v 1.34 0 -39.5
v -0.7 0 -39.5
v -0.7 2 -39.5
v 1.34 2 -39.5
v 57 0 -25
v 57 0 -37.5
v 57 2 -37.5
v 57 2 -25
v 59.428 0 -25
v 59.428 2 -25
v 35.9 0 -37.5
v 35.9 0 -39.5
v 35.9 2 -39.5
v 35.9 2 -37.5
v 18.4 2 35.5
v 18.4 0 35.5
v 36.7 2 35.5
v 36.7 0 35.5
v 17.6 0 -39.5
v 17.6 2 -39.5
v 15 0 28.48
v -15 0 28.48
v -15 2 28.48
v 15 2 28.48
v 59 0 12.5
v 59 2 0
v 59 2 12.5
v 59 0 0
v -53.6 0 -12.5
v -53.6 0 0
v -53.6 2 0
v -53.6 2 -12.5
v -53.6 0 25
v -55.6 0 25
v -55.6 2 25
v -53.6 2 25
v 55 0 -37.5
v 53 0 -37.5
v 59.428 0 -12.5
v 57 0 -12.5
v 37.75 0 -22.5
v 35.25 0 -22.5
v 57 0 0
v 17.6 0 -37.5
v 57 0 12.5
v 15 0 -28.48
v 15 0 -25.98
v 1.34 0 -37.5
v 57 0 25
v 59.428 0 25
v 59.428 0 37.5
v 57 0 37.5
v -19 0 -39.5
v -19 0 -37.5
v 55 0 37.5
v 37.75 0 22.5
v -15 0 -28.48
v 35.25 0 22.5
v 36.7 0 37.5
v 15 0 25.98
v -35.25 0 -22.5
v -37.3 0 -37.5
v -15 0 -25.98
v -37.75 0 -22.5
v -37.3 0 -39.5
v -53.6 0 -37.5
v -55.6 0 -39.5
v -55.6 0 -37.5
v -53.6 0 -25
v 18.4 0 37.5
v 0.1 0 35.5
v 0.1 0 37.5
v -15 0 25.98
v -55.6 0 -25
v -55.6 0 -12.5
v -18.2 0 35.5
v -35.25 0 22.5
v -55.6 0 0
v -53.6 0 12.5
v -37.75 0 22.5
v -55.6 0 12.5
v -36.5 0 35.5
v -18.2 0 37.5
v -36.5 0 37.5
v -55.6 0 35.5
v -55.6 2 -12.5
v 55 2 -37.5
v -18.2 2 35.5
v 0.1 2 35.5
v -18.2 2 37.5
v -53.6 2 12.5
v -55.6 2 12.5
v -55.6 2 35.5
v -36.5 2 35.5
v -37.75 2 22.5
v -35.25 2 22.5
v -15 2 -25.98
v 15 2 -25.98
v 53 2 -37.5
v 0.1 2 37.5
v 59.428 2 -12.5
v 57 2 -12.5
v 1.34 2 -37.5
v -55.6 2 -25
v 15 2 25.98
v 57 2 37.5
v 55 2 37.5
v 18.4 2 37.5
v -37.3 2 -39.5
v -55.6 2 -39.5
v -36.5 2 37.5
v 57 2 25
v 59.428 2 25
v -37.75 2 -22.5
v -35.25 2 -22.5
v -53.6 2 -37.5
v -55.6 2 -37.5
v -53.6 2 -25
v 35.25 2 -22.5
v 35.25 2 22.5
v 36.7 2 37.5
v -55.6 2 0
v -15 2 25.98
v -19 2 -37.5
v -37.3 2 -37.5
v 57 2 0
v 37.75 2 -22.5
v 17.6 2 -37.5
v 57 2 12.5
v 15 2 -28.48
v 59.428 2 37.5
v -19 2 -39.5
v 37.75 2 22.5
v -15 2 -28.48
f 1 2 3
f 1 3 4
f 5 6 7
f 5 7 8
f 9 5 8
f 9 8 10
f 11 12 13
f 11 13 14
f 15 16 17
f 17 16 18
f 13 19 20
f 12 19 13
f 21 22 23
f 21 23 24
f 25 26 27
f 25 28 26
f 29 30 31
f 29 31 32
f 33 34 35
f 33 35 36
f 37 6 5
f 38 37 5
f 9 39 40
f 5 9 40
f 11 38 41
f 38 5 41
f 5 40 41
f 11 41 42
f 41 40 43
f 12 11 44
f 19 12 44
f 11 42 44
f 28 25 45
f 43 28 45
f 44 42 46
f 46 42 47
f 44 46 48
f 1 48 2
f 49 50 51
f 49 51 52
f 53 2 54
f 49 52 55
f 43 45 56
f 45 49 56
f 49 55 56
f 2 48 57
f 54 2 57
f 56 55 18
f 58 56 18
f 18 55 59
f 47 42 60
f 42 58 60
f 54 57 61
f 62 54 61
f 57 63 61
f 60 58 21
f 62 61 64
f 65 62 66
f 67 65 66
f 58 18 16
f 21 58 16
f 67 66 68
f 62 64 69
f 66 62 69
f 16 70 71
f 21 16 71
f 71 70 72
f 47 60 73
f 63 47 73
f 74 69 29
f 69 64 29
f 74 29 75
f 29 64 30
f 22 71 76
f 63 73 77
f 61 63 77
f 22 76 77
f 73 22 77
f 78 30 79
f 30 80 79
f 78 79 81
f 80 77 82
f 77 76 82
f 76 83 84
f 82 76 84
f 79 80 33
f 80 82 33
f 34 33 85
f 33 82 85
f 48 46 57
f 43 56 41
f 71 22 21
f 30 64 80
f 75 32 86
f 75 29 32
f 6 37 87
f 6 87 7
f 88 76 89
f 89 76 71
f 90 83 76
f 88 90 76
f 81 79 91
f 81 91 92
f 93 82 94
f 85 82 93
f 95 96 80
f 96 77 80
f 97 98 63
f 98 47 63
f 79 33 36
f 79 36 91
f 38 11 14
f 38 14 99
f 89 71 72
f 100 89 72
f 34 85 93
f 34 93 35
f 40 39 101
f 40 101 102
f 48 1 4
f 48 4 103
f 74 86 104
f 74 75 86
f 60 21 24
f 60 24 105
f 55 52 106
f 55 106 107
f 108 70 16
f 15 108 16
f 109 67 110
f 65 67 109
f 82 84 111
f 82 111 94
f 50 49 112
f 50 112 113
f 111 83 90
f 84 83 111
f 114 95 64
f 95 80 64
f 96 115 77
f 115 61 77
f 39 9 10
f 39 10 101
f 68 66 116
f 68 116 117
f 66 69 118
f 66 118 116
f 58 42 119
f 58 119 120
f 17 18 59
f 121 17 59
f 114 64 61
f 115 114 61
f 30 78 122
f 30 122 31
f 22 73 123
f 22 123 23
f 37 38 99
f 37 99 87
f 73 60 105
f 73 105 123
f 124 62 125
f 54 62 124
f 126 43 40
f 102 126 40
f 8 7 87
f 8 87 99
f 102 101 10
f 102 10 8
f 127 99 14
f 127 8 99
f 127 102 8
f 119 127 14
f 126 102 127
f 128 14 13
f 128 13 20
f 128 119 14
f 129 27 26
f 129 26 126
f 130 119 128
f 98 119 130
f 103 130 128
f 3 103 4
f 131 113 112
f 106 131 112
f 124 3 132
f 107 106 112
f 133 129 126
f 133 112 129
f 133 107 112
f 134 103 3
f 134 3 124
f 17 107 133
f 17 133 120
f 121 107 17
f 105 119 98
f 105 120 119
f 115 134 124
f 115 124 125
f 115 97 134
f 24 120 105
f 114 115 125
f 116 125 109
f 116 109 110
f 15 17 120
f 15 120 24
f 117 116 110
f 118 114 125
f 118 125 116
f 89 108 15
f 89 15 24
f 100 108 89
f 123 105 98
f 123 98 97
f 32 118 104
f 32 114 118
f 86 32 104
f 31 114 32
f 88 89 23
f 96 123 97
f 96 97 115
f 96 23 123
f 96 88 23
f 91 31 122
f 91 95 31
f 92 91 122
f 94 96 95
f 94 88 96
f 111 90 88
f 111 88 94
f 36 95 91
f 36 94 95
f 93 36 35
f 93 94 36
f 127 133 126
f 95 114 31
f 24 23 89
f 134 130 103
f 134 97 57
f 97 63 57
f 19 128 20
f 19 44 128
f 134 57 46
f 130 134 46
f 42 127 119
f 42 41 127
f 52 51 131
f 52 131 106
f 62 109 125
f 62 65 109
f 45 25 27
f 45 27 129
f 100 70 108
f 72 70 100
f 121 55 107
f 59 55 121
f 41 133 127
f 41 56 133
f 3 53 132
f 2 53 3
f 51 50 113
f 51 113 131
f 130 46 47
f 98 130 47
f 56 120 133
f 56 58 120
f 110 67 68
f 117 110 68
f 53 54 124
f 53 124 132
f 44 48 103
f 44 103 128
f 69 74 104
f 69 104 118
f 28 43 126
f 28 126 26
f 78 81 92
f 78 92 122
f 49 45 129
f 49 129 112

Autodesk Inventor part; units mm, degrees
ref_plane "YZ Plane" through (0, 0, 0) normal (1, 0, 0) x (0, 1, 0)
ref_plane "XZ Plane" through (0, 0, 0) normal (0, 1, 0) x (-1, 0, 0)
ref_plane "XY Plane" through (0, 0, 0) normal (0, 0, 1) x (1, 0, 0)
sketch "Sketch1" plane through (0, 0, 0) normal (0, 1, 0) x (-1, 0, 0)
  point P0 (0, 0)
sketch "Sketch2" plane through (0, 0, 0) normal (0, 1, 0) x (-1, 0, 0)
  line L0 (55.6, -39.5) -> (55.6, -37.5)
  line L1 (55.6, -39.5) -> (37.3, -39.5)
  line L2 (37.3, -39.5) -> (37.3, -37.5)
  line L3 (37.3, -37.5) -> (19, -37.5)
  line L4 (19, -37.5) -> (19, -39.5)
  line L5 (19, -39.5) -> (0.7, -39.5)
  line L6 (-1.34, -37.5) -> (-17.6, -37.5)
  line L7 (-17.6, -37.5) -> (-17.6, -39.5)
  line L8 (-17.6, -39.5) -> (-35.9, -39.5)
  line L9 (-35.9, -39.5) -> (-35.9, -37.5)
  line L10 (-35.9, -37.5) -> (-53, -37.5)
  line L11 (-55, 37.5) -> (-36.7, 37.5)
  line L12 (-18.4, 37.5) -> (-0.1, 37.5)
  line L13 (18.2, 37.5) -> (36.5, 37.5)
  line L14 (55.6, 35.5) -> (55.6, 25)
  line L15 (55.6, 12.5) -> (55.6, 0)
  line L16 (55.6, -12.5) -> (55.6, -25)
  line L17 (55.6, 25) -> (53.6, 25)
  line L18 (53.6, 25) -> (53.6, 12.5)
  line L19 (53.6, 12.5) -> (55.6, 12.5)
  line L20 (55.6, 0) -> (53.6, 0)
  line L21 (53.6, 0) -> (53.6, -12.5)
  line L22 (53.6, -12.5) -> (55.6, -12.5)
  line L23 (55.6, -25) -> (53.6, -25)
  line L24 (53.6, -25) -> (53.6, -37.5)
  line L25 (53.6, -37.5) -> (55.6, -37.5)
  line L26 (36.5, 37.5) -> (36.5, 35.5)
  line L27 (36.5, 35.5) -> (55.6, 35.5)
  line L28 (18.2, 37.5) -> (18.2, 35.5)
  line L29 (18.2, 35.5) -> (-0.1, 35.5)
  line L30 (-0.1, 35.5) -> (-0.1, 37.5)
  line L31 (-18.4, 37.5) -> (-18.4, 35.5)
  line L32 (-18.4, 35.5) -> (-36.7, 35.5)
  line L33 (-36.7, 35.5) -> (-36.7, 37.5)
  line L34 (37.75, -22.5) -> (35.25, -22.5)
  line L35 (35.25, -22.5) -> (35.25, 22.5)
  line L36 (35.25, 22.5) -> (37.75, 22.5)
  line L37 (37.75, 22.5) -> (37.75, -22.5)
  line L38 (37.75, -22.5) -> (35.25, 22.5) construction
  line L39 (35.25, -22.5) -> (37.75, 22.5) construction
  line L40 (-37.75, -22.5) -> (-35.25, -22.5)
  line L41 (-35.25, -22.5) -> (-35.25, 22.5)
  line L42 (-35.25, 22.5) -> (-37.75, 22.5)
  line L43 (-37.75, 22.5) -> (-37.75, -22.5)
  line L44 (-37.75, -22.5) -> (-35.25, 22.5) construction
  line L45 (-35.25, -22.5) -> (-37.75, 22.5) construction
  line L46 (15, -28.4801) -> (-15, -28.4801)
  line L47 (-15, -28.4801) -> (-15, -25.9801)
  line L48 (-15, -25.9801) -> (15, -25.9801)
  line L49 (15, -25.9801) -> (15, -28.4801)
  line L50 (15, -28.4801) -> (-15, -25.9801) construction
  line L51 (-15, -28.4801) -> (15, -25.9801) construction
  line L52 (15, 28.4801) -> (-15, 28.4801)
  line L53 (-15, 28.4801) -> (-15, 25.9801)
  line L54 (-15, 25.9801) -> (15, 25.9801)
  line L55 (15, 25.9801) -> (15, 28.4801)
  line L56 (15, 28.4801) -> (-15, 25.9801) construction
  line L57 (-15, 28.4801) -> (15, 25.9801) construction
  line L58 (-53, -37.5) -> (-55, -37.5)
  line L59 (-57, -22.5) -> (-57, -22.4801)
  line L60 (-57, 37.5) -> (-55, 37.5)
  line L61 (-55, -37.5) -> (-57, -37.5)
  line L62 (-57, -37.5) -> (-57, -25)
  line L63 (-57, -25) -> (-59.4283, -25)
  line L64 (-59.4283, -25) -> (-59.4283, -12.5)
  line L65 (-59.4283, -12.5) -> (-57, -12.5)
  line L66 (-57, 0) -> (-57, -12.5)
  line L67 (-57, 0) -> (-59, 0)
  line L68 (-59, 0) -> (-59, 12.5)
  line L69 (-59, 12.5) -> (-57, 12.5)
  line L70 (-57, 12.5) -> (-57, 25)
  line L71 (-57, 25) -> (-59.4283, 25)
  line L72 (-59.4283, 25) -> (-59.4283, 37.5)
  line L73 (-59.4283, 37.5) -> (-57, 37.5)
  line L74 (0.7, -39.5) -> (-1.34, -39.5)
  line L75 (-1.34, -39.5) -> (-1.34, -37.5)
  point P0 (0.7, -37.5)
  point P1 (-55, 22.5)
  point P2 (-53, 22.5)
  point P3 (-53, 0)
  point P4 (-53, -12.5)
  point P5 (36.5, 0)
  point P6 (-36.5, 0)
  point P7 (0, -27.2301)
  point P8 (0, 27.2301)
  dimension "d55" = 18.3
  dimension "d56" = 2.04
extrude "Extrusion1" add sketch "Sketch2" along normal blind 2
properties part number "BLKG"
